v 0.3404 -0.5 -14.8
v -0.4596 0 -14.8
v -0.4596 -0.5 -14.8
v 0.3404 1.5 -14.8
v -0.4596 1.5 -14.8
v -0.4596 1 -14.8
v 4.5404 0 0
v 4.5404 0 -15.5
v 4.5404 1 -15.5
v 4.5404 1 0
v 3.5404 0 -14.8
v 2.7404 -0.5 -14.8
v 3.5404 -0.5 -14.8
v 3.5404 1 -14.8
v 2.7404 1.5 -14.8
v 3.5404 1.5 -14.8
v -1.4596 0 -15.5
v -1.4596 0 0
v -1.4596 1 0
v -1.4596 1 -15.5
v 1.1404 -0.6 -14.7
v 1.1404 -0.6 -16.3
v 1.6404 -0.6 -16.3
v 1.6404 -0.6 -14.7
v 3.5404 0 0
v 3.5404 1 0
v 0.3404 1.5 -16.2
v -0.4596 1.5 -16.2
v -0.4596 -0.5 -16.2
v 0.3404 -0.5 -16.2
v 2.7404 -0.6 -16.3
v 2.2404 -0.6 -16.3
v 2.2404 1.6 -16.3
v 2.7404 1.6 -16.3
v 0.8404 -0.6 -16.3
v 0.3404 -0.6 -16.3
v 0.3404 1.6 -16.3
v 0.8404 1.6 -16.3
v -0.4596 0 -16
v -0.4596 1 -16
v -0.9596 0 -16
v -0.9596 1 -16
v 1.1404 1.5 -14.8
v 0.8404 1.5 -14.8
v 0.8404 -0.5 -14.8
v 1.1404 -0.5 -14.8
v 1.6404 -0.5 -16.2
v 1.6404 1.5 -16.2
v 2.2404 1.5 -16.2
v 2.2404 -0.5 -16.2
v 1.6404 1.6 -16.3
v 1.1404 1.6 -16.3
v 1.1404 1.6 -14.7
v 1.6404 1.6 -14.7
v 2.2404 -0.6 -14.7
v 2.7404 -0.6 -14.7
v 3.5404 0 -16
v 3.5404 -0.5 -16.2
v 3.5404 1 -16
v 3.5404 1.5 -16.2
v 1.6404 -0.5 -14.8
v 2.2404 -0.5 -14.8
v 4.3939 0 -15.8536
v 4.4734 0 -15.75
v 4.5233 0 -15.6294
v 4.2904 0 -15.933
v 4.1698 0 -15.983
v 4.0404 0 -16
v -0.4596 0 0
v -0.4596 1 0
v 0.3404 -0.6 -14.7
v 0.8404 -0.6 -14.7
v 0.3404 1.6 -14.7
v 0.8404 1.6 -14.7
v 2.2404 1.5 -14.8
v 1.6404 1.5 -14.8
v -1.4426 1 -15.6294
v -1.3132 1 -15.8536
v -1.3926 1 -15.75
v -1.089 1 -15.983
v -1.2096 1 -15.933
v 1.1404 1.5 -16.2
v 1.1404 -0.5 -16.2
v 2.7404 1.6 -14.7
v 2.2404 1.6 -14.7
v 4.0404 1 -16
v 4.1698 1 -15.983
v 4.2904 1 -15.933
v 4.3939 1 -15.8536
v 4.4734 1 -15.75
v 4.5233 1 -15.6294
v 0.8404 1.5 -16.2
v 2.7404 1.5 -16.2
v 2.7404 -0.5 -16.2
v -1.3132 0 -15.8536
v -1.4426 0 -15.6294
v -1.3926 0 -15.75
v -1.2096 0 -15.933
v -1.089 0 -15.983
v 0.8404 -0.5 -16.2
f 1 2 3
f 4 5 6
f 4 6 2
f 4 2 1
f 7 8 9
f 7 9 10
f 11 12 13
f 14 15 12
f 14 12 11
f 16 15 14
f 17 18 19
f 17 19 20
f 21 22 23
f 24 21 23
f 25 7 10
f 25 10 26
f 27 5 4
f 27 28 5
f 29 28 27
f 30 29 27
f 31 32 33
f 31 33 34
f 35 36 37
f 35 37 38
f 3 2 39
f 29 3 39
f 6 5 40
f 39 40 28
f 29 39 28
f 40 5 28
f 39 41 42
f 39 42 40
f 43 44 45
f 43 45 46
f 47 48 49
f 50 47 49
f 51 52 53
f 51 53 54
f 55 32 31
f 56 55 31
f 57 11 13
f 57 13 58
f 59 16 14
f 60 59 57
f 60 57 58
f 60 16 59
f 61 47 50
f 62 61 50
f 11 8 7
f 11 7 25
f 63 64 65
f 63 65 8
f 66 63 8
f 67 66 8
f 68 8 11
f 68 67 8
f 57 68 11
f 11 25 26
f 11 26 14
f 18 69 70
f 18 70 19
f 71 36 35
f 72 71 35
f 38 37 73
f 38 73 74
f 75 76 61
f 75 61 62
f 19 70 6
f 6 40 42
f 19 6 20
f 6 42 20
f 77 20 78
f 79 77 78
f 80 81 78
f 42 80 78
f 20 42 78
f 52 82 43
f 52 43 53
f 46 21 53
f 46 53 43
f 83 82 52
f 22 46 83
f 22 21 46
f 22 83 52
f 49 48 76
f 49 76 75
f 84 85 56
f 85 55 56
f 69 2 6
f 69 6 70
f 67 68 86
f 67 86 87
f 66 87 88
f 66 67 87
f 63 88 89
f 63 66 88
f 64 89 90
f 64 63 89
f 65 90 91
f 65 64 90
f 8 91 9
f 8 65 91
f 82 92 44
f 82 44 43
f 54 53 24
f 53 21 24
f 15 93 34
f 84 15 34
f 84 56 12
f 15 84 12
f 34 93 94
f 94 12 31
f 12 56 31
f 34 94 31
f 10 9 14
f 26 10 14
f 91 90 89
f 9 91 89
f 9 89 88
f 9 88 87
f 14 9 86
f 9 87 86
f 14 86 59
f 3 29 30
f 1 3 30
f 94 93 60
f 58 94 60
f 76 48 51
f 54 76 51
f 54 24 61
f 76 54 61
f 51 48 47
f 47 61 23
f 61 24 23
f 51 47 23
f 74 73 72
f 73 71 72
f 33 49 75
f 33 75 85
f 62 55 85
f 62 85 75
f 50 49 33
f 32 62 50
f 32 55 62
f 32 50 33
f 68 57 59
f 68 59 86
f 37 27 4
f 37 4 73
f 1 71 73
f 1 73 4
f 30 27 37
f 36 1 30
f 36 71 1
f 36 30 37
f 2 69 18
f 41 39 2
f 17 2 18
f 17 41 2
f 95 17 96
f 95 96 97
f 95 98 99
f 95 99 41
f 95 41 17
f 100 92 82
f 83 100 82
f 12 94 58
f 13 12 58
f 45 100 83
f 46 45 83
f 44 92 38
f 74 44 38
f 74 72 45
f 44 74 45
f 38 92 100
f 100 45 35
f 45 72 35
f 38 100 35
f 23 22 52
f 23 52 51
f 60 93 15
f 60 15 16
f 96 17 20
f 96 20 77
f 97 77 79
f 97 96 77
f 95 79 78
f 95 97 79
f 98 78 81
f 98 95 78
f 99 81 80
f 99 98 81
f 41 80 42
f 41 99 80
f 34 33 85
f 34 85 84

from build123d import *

# Parameters (mm, degrees)
BOSS_EXTRUDE1_DEPTH = 1
SKETCH3_W           = 4
SKETCH3_H           = 1.4
BOSS_EXTRUDE2_DEPTH = 1.5
SKETCH4_W           = 4
SKETCH4_H           = 1.4
CUT_EXTRUDE1_DEPTH  = 1
SKETCH5_W           = 0.5
SKETCH5_H           = 1.6
BOSS_EXTRUDE4_DEPTH = 2.1
SKETCH6_W           = 0.5
SKETCH6_H           = 1.6
BOSS_EXTRUDE5_DEPTH = 0.1


with BuildPart() as part:
    # Sketch1 → Boss-Extrude1 (new body)
    with BuildSketch(Plane(origin=(0, 0, 0), x_dir=(1, 0, 0), z_dir=(0, 1, 0))):
        with BuildLine():
            Line((-1.459627329, 0), (-1.459627329, 15.5))
            ThreePointArc((-1.459627329, 15.5), (-1.31318072, 15.853553391), (-0.959627329, 16))
            Line((-0.959627329, 16), (4.040372671, 16))
            ThreePointArc((4.040372671, 16), (4.393926061, 15.853553391), (4.540372671, 15.5))
            Line((4.540372671, 15.5), (4.540372671, 0))
            Line((4.540372671, 0), (3.540372671, 0))
            Line((3.540372671, 0), (3.540372671, 15))
            Line((3.540372671, 15), (-0.459627329, 15))
            Line((-0.459627329, 15), (-0.459627329, 0))
            Line((-0.459627329, 0), (-1.459627329, 0))
        make_face()
    extrude(amount=BOSS_EXTRUDE1_DEPTH)

    # Sketch3 → Boss-Extrude2 (add, symmetric)
    with BuildSketch(Plane(origin=(0, 1, 0), x_dir=(1, 0, 0), z_dir=(0, 1, 0))):
        with Locations((1.540372671, 15.5)):
            Rectangle(SKETCH3_W, SKETCH3_H)
    extrude(amount=BOSS_EXTRUDE2_DEPTH, both=True)

    # Sketch4 → Cut-Extrude1 (cut)
    with BuildSketch(Plane(origin=(0, 2.5, 0), x_dir=(1, 0, 0), z_dir=(0, 1, 0))):
        with Locations((1.540372671, 15.5)):
            Rectangle(SKETCH4_W, SKETCH4_H)
    extrude(amount=-CUT_EXTRUDE1_DEPTH, mode=Mode.SUBTRACT)

    # Sketch5 → Boss-Extrude4 (add)
    with BuildSketch(Plane(origin=(0, 1.5, 0), x_dir=(1, 0, 0), z_dir=(0, 1, 0))):
        with Locations((0.590372671, 15.5)):
            Rectangle(SKETCH5_W, SKETCH5_H)
        with Locations((1.390372671, 15.5)):
            Rectangle(SKETCH5_W, SKETCH5_H)
        with Locations((2.490372671, 15.5)):
            Rectangle(SKETCH5_W, SKETCH5_H)
    extrude(amount=-BOSS_EXTRUDE4_DEPTH)

    # Sketch6 → Boss-Extrude5 (add)
    with BuildSketch(Plane(origin=(0, 1.5, 0), x_dir=(1, 0, 0), z_dir=(0, 1, 0))):
        with Locations((0.590372671, 15.5)):
            Rectangle(SKETCH6_W, SKETCH6_H)
        with Locations((1.390372671, 15.5)):
            Rectangle(SKETCH6_W, SKETCH6_H)
        with Locations((2.490372671, 15.5)):
            Rectangle(SKETCH6_W, SKETCH6_H)
    extrude(amount=BOSS_EXTRUDE5_DEPTH)


solid = part.part
